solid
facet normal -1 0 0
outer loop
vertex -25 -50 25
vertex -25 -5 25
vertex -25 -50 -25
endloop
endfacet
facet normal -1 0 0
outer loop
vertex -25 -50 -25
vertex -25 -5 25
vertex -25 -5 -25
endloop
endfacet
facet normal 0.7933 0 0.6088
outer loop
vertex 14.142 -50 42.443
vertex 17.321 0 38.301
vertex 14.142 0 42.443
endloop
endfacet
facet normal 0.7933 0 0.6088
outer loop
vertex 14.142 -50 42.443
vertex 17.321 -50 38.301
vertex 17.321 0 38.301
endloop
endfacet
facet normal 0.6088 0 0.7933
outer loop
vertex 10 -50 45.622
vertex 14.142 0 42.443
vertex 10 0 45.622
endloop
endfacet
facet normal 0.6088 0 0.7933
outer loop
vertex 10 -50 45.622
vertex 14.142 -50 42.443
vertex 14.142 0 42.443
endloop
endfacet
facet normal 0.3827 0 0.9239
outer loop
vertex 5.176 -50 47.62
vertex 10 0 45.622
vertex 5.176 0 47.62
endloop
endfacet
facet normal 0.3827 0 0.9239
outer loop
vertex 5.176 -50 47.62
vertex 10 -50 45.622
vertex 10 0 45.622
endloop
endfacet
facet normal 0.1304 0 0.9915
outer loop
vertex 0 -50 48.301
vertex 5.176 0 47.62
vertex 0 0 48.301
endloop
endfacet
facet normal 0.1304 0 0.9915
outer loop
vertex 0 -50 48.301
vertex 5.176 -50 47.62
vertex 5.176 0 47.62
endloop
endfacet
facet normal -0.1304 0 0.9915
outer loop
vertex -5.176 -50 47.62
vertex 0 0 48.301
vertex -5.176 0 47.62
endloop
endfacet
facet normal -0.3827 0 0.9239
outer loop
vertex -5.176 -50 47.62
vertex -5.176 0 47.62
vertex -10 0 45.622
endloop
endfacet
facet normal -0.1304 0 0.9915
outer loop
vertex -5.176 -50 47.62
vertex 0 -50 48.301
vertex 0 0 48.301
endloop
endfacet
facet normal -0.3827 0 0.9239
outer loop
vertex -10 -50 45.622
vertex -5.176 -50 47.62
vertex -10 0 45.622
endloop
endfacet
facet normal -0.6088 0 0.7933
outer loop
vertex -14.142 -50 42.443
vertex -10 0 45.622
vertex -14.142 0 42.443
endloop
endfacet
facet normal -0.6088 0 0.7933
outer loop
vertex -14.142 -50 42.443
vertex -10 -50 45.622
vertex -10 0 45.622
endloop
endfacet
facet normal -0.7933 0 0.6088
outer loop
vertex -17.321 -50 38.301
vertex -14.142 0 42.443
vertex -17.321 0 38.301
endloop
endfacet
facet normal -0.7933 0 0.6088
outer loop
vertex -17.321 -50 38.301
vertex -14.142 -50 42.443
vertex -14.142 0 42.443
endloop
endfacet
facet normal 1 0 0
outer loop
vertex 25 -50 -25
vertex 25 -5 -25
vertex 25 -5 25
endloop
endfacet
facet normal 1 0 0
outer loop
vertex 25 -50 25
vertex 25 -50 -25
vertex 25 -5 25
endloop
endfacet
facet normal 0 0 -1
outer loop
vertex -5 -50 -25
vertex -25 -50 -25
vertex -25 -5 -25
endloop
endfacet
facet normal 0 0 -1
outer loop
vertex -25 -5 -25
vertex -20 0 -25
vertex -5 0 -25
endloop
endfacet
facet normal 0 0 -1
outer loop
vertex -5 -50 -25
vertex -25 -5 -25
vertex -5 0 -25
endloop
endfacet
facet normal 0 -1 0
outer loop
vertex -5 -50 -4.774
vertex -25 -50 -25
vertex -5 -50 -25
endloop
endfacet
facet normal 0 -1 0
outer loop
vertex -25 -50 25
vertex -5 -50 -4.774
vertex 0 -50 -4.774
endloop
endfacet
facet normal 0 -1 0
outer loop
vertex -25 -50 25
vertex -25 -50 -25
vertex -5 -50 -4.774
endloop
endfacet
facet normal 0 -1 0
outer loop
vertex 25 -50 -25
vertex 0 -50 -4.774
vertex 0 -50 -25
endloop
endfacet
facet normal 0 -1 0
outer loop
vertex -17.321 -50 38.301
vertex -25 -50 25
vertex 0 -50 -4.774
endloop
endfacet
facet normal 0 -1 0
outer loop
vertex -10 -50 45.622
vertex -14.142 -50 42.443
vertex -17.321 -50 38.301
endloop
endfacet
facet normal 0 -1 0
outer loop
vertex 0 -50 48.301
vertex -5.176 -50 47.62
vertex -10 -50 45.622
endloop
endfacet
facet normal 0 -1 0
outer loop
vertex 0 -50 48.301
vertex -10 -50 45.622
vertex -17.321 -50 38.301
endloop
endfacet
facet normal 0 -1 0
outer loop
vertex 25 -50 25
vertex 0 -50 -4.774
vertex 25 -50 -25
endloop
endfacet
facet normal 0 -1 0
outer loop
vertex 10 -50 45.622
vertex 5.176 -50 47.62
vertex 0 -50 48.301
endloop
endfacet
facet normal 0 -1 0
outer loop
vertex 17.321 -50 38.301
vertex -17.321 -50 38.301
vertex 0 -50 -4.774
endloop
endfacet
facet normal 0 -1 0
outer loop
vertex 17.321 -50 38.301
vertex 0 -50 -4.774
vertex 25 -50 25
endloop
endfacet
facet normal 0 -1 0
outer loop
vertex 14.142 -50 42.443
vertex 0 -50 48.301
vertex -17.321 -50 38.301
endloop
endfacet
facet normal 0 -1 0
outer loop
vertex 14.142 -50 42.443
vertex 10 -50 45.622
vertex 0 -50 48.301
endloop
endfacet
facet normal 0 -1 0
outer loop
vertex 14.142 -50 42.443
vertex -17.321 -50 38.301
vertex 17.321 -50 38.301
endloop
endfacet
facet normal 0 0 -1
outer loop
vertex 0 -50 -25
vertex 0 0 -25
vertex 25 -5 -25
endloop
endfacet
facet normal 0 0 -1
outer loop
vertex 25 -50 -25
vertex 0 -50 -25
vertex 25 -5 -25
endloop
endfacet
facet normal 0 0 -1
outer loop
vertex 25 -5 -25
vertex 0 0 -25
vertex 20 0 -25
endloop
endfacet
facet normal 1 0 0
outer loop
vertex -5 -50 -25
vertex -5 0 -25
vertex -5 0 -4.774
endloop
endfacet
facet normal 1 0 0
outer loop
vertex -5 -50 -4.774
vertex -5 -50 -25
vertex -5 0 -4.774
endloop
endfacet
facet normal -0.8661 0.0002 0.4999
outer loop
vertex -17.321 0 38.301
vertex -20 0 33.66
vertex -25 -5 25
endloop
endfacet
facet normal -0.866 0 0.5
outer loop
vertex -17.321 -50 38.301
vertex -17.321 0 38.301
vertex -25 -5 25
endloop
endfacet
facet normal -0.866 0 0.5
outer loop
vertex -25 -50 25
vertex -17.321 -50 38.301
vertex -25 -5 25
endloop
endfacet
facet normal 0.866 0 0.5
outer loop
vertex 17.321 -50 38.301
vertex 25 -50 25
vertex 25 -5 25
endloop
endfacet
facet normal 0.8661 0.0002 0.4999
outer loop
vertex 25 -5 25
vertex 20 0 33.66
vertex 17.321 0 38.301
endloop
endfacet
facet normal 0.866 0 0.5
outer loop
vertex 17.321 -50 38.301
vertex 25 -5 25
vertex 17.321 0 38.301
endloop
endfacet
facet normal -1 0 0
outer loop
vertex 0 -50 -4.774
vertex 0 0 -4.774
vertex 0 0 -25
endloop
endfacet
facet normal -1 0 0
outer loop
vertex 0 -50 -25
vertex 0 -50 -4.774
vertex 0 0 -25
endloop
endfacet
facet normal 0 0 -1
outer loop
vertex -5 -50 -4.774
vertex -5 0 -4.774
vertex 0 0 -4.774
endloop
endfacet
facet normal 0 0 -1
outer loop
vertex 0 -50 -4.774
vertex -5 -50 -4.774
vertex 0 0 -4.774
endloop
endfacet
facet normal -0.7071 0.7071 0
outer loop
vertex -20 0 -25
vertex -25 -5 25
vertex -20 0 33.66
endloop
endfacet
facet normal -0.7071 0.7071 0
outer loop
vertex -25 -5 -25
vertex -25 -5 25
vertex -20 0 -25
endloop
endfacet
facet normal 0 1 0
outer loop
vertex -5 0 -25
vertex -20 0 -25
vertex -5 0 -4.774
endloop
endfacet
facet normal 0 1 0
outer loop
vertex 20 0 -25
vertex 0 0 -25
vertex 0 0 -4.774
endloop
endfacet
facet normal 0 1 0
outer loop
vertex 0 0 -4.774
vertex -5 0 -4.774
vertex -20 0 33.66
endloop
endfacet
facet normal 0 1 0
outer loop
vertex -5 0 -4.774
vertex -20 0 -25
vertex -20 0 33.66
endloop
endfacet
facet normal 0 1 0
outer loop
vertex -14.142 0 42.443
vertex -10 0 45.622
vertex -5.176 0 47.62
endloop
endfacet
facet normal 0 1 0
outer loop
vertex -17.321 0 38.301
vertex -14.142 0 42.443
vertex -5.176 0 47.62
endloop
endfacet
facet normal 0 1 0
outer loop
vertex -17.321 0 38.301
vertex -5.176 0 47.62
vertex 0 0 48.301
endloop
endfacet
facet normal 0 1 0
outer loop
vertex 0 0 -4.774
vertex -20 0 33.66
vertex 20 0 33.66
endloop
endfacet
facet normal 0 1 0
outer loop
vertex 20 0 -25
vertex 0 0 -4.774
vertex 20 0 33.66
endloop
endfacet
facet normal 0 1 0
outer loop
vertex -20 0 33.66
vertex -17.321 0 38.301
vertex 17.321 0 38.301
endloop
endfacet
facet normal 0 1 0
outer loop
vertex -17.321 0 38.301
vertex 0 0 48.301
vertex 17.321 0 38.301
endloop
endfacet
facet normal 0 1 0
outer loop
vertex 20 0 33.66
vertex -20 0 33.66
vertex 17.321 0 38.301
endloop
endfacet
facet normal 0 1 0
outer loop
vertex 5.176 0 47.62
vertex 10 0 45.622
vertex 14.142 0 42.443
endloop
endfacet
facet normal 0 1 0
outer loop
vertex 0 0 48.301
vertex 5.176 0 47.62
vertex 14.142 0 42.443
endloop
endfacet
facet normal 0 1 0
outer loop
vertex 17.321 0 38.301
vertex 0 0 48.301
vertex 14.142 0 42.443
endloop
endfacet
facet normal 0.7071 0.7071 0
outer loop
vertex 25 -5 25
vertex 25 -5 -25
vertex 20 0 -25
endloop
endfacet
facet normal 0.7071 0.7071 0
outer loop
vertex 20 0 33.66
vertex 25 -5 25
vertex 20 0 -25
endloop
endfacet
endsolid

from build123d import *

# Parameters (mm, degrees)
F1_DEPTH = 50
F2_R     = 20
F3_SIZE  = 5


with BuildPart() as f1:
    # F0 (on Front) → F1 (new body)
    with BuildSketch(Plane.XZ):
        Polygon((0, -25), (25, -25), (25, 25), (0, 68.30127), (-25, 25), (-25, -25), (-5, -25), (-5, -4.773571), (0, -4.773571), align=None)
    extrude(amount=F1_DEPTH)

    # F2
    f2_edges = [f1.edges().sort_by_distance(p)[0] for p in [
        (0, -25, 68.30127),
    ]]
    fillet(f2_edges, radius=F2_R)

    # F3
    f3_edges = [f1.edges().sort_by_distance(p)[0] for p in [
        (25, 0, 0),
        (-25, 0, 0),
    ]]
    chamfer(f3_edges, length=F3_SIZE)


solid = f1.part
